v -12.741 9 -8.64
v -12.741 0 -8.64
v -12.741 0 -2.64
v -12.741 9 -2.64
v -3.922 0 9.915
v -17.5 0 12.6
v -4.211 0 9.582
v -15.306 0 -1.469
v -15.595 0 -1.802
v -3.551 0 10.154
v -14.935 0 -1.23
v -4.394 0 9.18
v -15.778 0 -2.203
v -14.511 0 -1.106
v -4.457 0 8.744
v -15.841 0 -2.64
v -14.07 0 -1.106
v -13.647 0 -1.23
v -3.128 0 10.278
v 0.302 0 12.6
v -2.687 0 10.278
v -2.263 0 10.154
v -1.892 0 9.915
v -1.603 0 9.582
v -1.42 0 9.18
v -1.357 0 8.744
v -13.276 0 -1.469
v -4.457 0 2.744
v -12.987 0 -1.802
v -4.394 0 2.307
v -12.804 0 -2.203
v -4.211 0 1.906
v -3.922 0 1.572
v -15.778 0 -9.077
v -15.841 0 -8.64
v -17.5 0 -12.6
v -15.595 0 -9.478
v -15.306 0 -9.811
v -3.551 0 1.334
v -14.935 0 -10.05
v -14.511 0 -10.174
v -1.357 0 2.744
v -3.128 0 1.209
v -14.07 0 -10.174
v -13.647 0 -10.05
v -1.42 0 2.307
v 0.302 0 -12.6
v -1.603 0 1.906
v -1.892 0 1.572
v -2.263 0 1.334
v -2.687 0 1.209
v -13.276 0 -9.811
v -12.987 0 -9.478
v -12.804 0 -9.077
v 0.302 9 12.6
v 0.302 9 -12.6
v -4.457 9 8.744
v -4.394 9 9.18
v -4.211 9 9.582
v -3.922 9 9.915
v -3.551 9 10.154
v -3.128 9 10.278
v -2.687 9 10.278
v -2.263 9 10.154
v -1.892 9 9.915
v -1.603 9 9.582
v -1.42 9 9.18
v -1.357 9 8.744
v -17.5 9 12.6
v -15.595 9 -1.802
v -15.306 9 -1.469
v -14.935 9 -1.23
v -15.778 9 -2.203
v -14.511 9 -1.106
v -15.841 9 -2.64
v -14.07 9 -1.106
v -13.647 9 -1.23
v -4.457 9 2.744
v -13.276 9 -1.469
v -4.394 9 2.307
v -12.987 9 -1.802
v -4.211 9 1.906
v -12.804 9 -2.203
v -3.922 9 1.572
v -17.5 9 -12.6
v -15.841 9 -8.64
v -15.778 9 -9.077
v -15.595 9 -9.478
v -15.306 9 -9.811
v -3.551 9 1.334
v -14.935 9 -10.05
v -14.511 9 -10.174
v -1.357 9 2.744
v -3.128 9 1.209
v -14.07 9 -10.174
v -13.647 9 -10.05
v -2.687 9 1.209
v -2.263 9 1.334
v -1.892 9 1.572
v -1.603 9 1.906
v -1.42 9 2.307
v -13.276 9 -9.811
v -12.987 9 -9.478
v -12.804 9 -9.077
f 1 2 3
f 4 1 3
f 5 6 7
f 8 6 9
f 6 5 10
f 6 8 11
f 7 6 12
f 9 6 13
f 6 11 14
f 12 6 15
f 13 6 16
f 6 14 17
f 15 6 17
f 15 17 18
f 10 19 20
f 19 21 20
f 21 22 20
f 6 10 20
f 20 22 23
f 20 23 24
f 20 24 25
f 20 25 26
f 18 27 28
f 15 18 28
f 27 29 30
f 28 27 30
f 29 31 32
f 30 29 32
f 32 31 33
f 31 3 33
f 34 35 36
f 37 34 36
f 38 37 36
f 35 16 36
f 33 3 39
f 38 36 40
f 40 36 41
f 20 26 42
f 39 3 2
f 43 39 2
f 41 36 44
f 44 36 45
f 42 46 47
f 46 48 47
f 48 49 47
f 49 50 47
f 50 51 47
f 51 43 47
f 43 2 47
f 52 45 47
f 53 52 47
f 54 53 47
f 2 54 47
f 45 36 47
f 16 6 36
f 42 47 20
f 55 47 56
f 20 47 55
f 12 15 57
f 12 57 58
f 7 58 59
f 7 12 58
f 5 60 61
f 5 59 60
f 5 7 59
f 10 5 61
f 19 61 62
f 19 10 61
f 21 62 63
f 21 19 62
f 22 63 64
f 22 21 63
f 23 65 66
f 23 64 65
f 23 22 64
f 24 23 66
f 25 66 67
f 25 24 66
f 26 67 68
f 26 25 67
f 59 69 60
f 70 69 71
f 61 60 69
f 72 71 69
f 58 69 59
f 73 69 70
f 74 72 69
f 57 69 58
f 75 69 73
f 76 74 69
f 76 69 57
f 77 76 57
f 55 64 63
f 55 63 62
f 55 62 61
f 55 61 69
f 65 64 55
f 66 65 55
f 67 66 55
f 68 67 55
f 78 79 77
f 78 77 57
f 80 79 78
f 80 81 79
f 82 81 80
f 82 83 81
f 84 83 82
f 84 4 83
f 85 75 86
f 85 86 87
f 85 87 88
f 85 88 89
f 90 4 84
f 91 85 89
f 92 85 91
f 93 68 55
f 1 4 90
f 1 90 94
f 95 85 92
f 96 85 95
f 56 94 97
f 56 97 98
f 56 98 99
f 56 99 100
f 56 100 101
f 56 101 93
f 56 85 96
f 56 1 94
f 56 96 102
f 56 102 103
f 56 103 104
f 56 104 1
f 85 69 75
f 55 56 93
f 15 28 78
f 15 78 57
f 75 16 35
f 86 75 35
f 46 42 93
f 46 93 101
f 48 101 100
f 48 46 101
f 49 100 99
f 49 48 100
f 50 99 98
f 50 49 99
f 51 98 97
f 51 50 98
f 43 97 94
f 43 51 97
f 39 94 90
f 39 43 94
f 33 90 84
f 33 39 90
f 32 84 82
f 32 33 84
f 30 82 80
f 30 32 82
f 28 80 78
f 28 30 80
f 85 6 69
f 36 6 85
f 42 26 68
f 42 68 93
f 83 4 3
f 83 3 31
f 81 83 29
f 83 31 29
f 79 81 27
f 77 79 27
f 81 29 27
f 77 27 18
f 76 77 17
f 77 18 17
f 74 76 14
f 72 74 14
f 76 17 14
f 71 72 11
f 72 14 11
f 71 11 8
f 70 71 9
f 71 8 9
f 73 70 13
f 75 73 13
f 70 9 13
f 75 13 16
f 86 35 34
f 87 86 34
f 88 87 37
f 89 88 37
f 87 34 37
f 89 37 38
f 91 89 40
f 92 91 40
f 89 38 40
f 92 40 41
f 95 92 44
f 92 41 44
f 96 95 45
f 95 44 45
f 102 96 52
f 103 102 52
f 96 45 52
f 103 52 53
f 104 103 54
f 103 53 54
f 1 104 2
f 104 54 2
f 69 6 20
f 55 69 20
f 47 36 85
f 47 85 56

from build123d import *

# Parameters (mm, degrees)
CROQUIS1_W              = 35
CROQUIS1_H              = 25.2
SALIENTE_EXTRUIR1_DEPTH = 9
CORTAR_EXTRUIR1_DEPTH   = 10
CROQUIS3_W              = 17.198072292
CROQUIS3_H              = 25.2
CORTAR_EXTRUIR2_DEPTH   = 10


with BuildPart() as part:
    # Croquis1 → Saliente-Extruir1 (new body)
    with BuildSketch(Plane(origin=(0, 0, 0), x_dir=(1, 0, 0), z_dir=(0, 1, 0))):
        Rectangle(CROQUIS1_W, CROQUIS1_H)
    extrude(amount=SALIENTE_EXTRUIR1_DEPTH)

    # Croquis2 → Cortar-Extruir1 (cut, through all)
    with BuildSketch(Plane.XZ):
        with BuildLine():
            Line((-4.457181896, 2.743708499), (-4.457181896, 8.743708499))
            ThreePointArc((-4.457181896, 8.743708499), (-2.907181896, 10.293708499), (-1.357181896, 8.743708499))
            Line((-1.357181896, 8.743708499), (-1.357181896, 2.743708499))
            ThreePointArc((-1.357181896, 2.743708499), (-2.907181896, 1.193708499), (-4.457181896, 2.743708499))
        make_face()
        with BuildLine():
            Line((-12.740890395, -8.64), (-12.740890395, -2.64))
            ThreePointArc((-12.740890395, -2.64), (-14.290890395, -1.09), (-15.840890395, -2.64))
            Line((-15.840890395, -2.64), (-15.840890395, -8.64))
            ThreePointArc((-15.840890395, -8.64), (-14.290890395, -10.19), (-12.740890395, -8.64))
        make_face()
    extrude(amount=-CORTAR_EXTRUIR1_DEPTH, mode=Mode.SUBTRACT)

    # Croquis3 → Cortar-Extruir2 (cut, through all)
    with BuildSketch(Plane.XZ):
        with Locations((8.900963854, 0)):
            Rectangle(CROQUIS3_W, CROQUIS3_H)
    extrude(amount=-CORTAR_EXTRUIR2_DEPTH, mode=Mode.SUBTRACT)


solid = part.part
